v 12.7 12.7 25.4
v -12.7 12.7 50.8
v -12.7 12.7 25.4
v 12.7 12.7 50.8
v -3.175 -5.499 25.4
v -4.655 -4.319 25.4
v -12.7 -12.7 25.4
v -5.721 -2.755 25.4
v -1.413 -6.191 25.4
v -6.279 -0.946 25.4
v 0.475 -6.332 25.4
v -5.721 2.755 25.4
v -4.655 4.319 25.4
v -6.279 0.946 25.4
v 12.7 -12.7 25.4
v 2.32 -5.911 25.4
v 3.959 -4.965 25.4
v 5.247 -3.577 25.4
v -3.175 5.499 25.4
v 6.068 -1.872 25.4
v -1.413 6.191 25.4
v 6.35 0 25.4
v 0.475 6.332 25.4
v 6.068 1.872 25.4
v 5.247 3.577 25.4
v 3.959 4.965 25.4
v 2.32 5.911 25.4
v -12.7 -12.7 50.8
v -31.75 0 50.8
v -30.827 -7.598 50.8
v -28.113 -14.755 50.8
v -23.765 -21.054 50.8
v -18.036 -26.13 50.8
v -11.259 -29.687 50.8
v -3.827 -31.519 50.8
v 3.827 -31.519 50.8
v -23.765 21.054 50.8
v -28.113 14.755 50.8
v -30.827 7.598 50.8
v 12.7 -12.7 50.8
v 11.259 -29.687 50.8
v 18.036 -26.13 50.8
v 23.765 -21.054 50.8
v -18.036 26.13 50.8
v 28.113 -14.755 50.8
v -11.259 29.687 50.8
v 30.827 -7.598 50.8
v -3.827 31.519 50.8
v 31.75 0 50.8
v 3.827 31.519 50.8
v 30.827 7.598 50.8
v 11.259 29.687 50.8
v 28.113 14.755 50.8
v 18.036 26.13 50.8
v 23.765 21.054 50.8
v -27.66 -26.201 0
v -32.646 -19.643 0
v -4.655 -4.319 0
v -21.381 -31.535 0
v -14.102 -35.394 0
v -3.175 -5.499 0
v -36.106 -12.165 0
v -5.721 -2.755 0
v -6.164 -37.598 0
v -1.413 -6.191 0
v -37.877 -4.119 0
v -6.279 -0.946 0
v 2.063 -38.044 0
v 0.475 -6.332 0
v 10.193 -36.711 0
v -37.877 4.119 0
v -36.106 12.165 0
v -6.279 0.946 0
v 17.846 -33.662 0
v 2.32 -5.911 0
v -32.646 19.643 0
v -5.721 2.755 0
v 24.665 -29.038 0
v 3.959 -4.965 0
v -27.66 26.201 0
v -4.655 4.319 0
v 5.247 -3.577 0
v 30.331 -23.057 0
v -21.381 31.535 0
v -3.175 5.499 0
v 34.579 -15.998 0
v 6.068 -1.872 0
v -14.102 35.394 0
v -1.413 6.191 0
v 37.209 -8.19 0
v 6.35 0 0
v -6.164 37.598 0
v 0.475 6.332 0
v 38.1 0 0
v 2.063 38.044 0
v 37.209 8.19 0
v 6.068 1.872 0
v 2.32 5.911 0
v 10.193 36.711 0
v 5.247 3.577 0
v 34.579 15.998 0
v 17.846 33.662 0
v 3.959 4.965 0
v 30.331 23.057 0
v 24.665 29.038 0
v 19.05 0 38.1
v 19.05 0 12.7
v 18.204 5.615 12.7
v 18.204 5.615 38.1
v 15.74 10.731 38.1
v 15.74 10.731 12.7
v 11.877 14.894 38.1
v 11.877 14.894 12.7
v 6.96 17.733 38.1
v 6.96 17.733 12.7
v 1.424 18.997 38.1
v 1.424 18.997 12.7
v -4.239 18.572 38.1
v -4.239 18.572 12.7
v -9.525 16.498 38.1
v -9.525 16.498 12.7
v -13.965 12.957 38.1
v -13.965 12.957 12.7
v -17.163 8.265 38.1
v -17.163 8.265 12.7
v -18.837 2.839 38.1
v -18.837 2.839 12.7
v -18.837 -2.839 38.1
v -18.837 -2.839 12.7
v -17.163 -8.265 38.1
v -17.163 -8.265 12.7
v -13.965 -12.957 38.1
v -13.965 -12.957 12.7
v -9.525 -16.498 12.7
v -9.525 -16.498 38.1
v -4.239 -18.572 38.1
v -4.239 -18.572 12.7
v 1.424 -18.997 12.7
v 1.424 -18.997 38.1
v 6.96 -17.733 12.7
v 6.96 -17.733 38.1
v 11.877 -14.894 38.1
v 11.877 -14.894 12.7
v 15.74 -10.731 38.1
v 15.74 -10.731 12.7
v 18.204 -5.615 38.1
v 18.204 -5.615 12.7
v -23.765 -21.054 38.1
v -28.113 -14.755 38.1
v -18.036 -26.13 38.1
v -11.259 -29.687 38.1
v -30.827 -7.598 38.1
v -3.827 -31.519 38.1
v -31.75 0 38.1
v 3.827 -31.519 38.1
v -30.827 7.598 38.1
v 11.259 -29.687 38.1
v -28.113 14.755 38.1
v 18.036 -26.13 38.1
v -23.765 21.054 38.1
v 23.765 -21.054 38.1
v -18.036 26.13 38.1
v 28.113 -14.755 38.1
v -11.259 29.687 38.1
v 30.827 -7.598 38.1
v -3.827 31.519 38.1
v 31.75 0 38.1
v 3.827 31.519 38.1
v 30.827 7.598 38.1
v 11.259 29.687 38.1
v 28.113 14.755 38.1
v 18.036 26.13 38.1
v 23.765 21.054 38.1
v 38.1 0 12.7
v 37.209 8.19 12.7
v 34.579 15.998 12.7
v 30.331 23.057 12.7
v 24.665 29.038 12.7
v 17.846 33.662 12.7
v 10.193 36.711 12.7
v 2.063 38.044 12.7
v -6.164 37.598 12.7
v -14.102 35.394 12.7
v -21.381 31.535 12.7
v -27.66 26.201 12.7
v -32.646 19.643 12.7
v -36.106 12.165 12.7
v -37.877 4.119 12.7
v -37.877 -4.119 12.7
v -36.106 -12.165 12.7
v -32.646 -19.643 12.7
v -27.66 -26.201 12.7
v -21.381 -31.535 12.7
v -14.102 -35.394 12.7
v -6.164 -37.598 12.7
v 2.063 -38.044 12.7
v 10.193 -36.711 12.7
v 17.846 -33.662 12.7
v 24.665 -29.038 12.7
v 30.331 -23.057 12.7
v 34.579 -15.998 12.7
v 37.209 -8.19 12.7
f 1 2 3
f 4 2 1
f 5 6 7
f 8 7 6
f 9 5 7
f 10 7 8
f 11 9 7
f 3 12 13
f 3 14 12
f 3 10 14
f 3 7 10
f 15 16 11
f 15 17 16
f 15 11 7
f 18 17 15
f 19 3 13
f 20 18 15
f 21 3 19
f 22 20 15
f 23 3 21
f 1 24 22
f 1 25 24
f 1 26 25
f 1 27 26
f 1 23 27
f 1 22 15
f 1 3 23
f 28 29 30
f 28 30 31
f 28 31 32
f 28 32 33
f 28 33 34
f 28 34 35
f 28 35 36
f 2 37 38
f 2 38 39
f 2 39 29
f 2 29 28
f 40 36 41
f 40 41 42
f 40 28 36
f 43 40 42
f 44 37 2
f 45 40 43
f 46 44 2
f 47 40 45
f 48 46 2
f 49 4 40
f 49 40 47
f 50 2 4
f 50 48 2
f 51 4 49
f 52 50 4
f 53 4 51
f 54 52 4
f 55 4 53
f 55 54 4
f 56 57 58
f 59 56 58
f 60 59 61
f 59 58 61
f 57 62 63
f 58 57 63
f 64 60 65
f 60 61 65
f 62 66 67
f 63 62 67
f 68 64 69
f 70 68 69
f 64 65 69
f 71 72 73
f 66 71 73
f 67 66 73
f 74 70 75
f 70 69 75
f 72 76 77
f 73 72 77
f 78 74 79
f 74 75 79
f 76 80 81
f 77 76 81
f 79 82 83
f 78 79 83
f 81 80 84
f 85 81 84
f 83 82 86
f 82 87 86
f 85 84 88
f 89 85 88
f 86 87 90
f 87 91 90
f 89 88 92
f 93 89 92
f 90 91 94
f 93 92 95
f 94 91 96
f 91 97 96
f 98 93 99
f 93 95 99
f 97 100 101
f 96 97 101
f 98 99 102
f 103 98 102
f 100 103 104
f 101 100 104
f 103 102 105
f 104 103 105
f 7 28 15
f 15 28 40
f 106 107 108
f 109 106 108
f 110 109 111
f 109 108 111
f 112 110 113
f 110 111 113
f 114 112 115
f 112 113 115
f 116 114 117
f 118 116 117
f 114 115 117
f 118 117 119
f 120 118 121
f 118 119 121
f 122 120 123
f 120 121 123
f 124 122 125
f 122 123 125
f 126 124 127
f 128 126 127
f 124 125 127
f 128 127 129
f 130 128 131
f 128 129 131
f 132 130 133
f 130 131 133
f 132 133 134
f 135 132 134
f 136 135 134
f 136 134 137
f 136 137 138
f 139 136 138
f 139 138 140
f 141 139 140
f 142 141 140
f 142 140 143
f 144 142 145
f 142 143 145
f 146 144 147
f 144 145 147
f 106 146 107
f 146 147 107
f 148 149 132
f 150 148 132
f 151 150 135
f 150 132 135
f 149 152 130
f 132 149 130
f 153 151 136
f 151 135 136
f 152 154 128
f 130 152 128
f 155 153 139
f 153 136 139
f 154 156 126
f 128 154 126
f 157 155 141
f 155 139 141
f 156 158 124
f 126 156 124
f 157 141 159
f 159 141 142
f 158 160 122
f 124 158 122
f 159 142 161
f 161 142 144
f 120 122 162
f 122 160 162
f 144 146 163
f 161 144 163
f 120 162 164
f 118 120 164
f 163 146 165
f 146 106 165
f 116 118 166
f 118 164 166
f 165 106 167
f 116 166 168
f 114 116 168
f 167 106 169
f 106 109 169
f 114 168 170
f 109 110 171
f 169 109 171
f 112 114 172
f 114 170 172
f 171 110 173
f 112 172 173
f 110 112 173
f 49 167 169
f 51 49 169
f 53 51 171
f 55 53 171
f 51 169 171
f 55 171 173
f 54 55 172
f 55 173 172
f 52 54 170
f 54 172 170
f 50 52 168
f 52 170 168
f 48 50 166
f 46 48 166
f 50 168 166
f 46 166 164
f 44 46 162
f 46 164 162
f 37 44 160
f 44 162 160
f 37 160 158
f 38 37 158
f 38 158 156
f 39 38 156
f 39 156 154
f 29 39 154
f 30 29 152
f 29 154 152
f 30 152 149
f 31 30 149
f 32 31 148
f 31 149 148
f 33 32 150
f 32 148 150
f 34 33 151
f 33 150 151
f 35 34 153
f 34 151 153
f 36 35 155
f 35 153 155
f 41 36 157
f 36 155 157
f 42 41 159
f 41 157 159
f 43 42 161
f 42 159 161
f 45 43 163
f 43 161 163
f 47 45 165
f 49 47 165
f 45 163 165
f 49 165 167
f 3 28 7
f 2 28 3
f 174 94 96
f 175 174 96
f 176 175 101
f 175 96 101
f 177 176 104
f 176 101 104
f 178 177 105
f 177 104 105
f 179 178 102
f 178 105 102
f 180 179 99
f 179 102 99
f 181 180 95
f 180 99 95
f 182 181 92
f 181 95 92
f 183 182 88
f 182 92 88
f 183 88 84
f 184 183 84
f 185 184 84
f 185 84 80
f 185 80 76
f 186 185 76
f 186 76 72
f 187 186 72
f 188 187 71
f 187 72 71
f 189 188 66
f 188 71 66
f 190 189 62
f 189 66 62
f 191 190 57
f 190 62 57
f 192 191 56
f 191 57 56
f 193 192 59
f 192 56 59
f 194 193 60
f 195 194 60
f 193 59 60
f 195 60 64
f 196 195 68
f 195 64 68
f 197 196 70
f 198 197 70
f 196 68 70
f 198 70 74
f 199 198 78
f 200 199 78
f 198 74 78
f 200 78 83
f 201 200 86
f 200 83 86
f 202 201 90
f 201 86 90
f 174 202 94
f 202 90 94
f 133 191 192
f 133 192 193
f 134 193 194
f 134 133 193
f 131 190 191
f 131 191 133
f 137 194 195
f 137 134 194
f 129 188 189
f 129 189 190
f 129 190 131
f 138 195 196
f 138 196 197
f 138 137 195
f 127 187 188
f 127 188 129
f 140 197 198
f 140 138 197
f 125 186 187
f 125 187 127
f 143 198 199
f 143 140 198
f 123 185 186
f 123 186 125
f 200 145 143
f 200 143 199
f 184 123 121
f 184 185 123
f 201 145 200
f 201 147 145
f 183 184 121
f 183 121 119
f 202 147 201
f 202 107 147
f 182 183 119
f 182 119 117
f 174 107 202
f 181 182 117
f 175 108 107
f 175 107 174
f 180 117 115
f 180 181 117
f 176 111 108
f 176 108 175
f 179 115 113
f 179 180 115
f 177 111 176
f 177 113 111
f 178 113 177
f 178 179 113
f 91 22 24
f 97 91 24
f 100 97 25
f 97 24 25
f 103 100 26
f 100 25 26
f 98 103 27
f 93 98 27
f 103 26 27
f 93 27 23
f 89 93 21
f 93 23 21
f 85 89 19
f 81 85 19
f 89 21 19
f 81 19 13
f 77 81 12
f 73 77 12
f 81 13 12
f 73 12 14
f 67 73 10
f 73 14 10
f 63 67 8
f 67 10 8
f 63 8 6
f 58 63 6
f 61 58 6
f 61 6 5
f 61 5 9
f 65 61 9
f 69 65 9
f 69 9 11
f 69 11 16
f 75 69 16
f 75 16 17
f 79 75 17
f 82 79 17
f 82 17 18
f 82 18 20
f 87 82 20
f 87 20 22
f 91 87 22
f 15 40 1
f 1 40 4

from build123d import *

# Parameters (mm, degrees)
F0_R     = 38.1
F1_DEPTH = 12.7
F2_R     = 19.05
F3_DEPTH = 25.4
F4_R     = 31.75
F5_DEPTH = 12.7
F6_W     = 25.4
F6_H     = 25.4
F7_DEPTH = 25.4
F8_R     = 6.35
F9_DEPTH = 50.801


with BuildPart() as f1:
    # F0 (on Top) → F1 (new body)
    with BuildSketch(Plane.XY):
        Circle(F0_R)
    extrude(amount=F1_DEPTH)

    # F2 (on face) → F3 (join)
    with BuildSketch(Plane.XY.offset(12.7)):
        Circle(F2_R)
    extrude(amount=F3_DEPTH)

    # F4 (on face) → F5 (join)
    with BuildSketch(Plane.XY.offset(38.1)):
        Circle(F4_R)
    extrude(amount=F5_DEPTH)

    # F6 (on face) → F7 (cut)
    with BuildSketch(Plane.XY.offset(50.8)):
        Rectangle(F6_W, F6_H)
    extrude(amount=-F7_DEPTH, mode=Mode.SUBTRACT)

    # F8 (on face) → F9 (cut, through all)
    with BuildSketch(Plane.XY.offset(50.8)):
        Circle(F8_R)
    extrude(amount=-F9_DEPTH, mode=Mode.SUBTRACT)


solid = f1.part
